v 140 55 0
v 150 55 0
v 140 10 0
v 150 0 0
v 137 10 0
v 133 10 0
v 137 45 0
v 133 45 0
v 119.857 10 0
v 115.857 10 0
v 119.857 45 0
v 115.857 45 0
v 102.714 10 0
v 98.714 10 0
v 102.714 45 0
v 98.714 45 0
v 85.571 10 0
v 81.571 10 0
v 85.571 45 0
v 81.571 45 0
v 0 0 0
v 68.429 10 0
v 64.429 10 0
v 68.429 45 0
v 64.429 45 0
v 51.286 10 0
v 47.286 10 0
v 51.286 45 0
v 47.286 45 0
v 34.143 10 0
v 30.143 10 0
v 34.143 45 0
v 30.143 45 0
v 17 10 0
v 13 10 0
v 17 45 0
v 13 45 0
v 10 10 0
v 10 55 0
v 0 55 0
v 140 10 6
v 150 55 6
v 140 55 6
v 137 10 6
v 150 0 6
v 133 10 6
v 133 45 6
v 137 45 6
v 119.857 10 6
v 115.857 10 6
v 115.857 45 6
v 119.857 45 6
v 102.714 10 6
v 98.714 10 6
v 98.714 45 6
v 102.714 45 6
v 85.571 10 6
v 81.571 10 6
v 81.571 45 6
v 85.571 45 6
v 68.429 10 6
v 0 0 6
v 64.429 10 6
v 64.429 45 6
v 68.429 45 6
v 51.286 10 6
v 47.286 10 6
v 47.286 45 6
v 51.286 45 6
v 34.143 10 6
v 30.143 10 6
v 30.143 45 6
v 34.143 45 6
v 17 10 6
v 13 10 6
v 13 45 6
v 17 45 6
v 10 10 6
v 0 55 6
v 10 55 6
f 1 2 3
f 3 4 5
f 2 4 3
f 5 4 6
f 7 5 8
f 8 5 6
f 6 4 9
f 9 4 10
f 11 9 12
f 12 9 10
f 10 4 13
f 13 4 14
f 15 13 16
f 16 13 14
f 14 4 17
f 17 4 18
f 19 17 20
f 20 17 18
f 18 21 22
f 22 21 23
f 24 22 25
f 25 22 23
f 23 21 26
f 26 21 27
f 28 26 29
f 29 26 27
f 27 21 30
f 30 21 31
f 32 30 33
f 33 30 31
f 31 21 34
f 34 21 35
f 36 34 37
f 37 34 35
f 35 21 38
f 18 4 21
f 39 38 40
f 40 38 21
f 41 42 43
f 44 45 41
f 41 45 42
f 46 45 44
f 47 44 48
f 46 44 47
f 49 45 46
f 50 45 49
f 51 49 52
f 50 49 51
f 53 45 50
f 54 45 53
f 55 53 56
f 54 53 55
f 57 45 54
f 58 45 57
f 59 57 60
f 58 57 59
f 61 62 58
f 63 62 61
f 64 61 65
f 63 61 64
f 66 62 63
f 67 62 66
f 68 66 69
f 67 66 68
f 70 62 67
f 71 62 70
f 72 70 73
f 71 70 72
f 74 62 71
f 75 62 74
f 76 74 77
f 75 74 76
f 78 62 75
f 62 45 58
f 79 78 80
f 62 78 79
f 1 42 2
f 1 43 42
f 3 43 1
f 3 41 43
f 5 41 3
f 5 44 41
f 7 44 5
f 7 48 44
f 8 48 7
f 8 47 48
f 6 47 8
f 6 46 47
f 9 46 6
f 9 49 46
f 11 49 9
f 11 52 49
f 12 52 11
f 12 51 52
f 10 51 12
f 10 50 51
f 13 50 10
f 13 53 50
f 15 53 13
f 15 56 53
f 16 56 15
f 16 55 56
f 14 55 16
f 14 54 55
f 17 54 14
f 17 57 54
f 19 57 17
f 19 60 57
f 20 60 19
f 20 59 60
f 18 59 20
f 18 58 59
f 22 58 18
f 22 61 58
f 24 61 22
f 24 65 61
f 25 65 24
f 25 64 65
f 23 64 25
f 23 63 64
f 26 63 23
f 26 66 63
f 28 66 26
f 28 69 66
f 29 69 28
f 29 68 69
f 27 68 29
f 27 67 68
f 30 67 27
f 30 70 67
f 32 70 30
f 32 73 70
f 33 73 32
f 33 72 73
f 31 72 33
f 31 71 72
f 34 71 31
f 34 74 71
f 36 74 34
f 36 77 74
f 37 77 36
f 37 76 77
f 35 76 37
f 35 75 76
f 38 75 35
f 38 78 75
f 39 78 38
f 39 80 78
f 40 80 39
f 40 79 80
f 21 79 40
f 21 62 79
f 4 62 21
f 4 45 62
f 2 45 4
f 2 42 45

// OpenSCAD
$fn = 32;

// ----------------------------------------------------------------------
// Guard grille: 8 slats over a 150 x 55 mm plate
// ----------------------------------------------------------------------

// --- parameters (mm) ---
profile_height = 6;       // extrusion height
profile_points = 40;      // points of the closed outline

profile = [[0, 0], [150, 0], [150, 55], [140, 55], [140, 10], [137, 10], [137, 45], [133, 45], [133, 10], [119.857, 10], [119.857, 45], [115.857, 45], [115.857, 10], [102.714, 10], [102.714, 45], [98.714, 45], [98.714, 10], [85.571, 10], [85.571, 45], [81.571, 45], [81.571, 10], [68.429, 10], [68.429, 45], [64.429, 45], [64.429, 10], [51.286, 10], [51.286, 45], [47.286, 45], [47.286, 10], [34.143, 10], [34.143, 45], [30.143, 45], [30.143, 10], [17, 10], [17, 45], [13, 45], [13, 10], [10, 10], [10, 55], [0, 55]];  // single closed polygon, 40 points, counter clockwise

// --- the one profile operation ---
linear_extrude(height = profile_height) polygon(points = profile);
